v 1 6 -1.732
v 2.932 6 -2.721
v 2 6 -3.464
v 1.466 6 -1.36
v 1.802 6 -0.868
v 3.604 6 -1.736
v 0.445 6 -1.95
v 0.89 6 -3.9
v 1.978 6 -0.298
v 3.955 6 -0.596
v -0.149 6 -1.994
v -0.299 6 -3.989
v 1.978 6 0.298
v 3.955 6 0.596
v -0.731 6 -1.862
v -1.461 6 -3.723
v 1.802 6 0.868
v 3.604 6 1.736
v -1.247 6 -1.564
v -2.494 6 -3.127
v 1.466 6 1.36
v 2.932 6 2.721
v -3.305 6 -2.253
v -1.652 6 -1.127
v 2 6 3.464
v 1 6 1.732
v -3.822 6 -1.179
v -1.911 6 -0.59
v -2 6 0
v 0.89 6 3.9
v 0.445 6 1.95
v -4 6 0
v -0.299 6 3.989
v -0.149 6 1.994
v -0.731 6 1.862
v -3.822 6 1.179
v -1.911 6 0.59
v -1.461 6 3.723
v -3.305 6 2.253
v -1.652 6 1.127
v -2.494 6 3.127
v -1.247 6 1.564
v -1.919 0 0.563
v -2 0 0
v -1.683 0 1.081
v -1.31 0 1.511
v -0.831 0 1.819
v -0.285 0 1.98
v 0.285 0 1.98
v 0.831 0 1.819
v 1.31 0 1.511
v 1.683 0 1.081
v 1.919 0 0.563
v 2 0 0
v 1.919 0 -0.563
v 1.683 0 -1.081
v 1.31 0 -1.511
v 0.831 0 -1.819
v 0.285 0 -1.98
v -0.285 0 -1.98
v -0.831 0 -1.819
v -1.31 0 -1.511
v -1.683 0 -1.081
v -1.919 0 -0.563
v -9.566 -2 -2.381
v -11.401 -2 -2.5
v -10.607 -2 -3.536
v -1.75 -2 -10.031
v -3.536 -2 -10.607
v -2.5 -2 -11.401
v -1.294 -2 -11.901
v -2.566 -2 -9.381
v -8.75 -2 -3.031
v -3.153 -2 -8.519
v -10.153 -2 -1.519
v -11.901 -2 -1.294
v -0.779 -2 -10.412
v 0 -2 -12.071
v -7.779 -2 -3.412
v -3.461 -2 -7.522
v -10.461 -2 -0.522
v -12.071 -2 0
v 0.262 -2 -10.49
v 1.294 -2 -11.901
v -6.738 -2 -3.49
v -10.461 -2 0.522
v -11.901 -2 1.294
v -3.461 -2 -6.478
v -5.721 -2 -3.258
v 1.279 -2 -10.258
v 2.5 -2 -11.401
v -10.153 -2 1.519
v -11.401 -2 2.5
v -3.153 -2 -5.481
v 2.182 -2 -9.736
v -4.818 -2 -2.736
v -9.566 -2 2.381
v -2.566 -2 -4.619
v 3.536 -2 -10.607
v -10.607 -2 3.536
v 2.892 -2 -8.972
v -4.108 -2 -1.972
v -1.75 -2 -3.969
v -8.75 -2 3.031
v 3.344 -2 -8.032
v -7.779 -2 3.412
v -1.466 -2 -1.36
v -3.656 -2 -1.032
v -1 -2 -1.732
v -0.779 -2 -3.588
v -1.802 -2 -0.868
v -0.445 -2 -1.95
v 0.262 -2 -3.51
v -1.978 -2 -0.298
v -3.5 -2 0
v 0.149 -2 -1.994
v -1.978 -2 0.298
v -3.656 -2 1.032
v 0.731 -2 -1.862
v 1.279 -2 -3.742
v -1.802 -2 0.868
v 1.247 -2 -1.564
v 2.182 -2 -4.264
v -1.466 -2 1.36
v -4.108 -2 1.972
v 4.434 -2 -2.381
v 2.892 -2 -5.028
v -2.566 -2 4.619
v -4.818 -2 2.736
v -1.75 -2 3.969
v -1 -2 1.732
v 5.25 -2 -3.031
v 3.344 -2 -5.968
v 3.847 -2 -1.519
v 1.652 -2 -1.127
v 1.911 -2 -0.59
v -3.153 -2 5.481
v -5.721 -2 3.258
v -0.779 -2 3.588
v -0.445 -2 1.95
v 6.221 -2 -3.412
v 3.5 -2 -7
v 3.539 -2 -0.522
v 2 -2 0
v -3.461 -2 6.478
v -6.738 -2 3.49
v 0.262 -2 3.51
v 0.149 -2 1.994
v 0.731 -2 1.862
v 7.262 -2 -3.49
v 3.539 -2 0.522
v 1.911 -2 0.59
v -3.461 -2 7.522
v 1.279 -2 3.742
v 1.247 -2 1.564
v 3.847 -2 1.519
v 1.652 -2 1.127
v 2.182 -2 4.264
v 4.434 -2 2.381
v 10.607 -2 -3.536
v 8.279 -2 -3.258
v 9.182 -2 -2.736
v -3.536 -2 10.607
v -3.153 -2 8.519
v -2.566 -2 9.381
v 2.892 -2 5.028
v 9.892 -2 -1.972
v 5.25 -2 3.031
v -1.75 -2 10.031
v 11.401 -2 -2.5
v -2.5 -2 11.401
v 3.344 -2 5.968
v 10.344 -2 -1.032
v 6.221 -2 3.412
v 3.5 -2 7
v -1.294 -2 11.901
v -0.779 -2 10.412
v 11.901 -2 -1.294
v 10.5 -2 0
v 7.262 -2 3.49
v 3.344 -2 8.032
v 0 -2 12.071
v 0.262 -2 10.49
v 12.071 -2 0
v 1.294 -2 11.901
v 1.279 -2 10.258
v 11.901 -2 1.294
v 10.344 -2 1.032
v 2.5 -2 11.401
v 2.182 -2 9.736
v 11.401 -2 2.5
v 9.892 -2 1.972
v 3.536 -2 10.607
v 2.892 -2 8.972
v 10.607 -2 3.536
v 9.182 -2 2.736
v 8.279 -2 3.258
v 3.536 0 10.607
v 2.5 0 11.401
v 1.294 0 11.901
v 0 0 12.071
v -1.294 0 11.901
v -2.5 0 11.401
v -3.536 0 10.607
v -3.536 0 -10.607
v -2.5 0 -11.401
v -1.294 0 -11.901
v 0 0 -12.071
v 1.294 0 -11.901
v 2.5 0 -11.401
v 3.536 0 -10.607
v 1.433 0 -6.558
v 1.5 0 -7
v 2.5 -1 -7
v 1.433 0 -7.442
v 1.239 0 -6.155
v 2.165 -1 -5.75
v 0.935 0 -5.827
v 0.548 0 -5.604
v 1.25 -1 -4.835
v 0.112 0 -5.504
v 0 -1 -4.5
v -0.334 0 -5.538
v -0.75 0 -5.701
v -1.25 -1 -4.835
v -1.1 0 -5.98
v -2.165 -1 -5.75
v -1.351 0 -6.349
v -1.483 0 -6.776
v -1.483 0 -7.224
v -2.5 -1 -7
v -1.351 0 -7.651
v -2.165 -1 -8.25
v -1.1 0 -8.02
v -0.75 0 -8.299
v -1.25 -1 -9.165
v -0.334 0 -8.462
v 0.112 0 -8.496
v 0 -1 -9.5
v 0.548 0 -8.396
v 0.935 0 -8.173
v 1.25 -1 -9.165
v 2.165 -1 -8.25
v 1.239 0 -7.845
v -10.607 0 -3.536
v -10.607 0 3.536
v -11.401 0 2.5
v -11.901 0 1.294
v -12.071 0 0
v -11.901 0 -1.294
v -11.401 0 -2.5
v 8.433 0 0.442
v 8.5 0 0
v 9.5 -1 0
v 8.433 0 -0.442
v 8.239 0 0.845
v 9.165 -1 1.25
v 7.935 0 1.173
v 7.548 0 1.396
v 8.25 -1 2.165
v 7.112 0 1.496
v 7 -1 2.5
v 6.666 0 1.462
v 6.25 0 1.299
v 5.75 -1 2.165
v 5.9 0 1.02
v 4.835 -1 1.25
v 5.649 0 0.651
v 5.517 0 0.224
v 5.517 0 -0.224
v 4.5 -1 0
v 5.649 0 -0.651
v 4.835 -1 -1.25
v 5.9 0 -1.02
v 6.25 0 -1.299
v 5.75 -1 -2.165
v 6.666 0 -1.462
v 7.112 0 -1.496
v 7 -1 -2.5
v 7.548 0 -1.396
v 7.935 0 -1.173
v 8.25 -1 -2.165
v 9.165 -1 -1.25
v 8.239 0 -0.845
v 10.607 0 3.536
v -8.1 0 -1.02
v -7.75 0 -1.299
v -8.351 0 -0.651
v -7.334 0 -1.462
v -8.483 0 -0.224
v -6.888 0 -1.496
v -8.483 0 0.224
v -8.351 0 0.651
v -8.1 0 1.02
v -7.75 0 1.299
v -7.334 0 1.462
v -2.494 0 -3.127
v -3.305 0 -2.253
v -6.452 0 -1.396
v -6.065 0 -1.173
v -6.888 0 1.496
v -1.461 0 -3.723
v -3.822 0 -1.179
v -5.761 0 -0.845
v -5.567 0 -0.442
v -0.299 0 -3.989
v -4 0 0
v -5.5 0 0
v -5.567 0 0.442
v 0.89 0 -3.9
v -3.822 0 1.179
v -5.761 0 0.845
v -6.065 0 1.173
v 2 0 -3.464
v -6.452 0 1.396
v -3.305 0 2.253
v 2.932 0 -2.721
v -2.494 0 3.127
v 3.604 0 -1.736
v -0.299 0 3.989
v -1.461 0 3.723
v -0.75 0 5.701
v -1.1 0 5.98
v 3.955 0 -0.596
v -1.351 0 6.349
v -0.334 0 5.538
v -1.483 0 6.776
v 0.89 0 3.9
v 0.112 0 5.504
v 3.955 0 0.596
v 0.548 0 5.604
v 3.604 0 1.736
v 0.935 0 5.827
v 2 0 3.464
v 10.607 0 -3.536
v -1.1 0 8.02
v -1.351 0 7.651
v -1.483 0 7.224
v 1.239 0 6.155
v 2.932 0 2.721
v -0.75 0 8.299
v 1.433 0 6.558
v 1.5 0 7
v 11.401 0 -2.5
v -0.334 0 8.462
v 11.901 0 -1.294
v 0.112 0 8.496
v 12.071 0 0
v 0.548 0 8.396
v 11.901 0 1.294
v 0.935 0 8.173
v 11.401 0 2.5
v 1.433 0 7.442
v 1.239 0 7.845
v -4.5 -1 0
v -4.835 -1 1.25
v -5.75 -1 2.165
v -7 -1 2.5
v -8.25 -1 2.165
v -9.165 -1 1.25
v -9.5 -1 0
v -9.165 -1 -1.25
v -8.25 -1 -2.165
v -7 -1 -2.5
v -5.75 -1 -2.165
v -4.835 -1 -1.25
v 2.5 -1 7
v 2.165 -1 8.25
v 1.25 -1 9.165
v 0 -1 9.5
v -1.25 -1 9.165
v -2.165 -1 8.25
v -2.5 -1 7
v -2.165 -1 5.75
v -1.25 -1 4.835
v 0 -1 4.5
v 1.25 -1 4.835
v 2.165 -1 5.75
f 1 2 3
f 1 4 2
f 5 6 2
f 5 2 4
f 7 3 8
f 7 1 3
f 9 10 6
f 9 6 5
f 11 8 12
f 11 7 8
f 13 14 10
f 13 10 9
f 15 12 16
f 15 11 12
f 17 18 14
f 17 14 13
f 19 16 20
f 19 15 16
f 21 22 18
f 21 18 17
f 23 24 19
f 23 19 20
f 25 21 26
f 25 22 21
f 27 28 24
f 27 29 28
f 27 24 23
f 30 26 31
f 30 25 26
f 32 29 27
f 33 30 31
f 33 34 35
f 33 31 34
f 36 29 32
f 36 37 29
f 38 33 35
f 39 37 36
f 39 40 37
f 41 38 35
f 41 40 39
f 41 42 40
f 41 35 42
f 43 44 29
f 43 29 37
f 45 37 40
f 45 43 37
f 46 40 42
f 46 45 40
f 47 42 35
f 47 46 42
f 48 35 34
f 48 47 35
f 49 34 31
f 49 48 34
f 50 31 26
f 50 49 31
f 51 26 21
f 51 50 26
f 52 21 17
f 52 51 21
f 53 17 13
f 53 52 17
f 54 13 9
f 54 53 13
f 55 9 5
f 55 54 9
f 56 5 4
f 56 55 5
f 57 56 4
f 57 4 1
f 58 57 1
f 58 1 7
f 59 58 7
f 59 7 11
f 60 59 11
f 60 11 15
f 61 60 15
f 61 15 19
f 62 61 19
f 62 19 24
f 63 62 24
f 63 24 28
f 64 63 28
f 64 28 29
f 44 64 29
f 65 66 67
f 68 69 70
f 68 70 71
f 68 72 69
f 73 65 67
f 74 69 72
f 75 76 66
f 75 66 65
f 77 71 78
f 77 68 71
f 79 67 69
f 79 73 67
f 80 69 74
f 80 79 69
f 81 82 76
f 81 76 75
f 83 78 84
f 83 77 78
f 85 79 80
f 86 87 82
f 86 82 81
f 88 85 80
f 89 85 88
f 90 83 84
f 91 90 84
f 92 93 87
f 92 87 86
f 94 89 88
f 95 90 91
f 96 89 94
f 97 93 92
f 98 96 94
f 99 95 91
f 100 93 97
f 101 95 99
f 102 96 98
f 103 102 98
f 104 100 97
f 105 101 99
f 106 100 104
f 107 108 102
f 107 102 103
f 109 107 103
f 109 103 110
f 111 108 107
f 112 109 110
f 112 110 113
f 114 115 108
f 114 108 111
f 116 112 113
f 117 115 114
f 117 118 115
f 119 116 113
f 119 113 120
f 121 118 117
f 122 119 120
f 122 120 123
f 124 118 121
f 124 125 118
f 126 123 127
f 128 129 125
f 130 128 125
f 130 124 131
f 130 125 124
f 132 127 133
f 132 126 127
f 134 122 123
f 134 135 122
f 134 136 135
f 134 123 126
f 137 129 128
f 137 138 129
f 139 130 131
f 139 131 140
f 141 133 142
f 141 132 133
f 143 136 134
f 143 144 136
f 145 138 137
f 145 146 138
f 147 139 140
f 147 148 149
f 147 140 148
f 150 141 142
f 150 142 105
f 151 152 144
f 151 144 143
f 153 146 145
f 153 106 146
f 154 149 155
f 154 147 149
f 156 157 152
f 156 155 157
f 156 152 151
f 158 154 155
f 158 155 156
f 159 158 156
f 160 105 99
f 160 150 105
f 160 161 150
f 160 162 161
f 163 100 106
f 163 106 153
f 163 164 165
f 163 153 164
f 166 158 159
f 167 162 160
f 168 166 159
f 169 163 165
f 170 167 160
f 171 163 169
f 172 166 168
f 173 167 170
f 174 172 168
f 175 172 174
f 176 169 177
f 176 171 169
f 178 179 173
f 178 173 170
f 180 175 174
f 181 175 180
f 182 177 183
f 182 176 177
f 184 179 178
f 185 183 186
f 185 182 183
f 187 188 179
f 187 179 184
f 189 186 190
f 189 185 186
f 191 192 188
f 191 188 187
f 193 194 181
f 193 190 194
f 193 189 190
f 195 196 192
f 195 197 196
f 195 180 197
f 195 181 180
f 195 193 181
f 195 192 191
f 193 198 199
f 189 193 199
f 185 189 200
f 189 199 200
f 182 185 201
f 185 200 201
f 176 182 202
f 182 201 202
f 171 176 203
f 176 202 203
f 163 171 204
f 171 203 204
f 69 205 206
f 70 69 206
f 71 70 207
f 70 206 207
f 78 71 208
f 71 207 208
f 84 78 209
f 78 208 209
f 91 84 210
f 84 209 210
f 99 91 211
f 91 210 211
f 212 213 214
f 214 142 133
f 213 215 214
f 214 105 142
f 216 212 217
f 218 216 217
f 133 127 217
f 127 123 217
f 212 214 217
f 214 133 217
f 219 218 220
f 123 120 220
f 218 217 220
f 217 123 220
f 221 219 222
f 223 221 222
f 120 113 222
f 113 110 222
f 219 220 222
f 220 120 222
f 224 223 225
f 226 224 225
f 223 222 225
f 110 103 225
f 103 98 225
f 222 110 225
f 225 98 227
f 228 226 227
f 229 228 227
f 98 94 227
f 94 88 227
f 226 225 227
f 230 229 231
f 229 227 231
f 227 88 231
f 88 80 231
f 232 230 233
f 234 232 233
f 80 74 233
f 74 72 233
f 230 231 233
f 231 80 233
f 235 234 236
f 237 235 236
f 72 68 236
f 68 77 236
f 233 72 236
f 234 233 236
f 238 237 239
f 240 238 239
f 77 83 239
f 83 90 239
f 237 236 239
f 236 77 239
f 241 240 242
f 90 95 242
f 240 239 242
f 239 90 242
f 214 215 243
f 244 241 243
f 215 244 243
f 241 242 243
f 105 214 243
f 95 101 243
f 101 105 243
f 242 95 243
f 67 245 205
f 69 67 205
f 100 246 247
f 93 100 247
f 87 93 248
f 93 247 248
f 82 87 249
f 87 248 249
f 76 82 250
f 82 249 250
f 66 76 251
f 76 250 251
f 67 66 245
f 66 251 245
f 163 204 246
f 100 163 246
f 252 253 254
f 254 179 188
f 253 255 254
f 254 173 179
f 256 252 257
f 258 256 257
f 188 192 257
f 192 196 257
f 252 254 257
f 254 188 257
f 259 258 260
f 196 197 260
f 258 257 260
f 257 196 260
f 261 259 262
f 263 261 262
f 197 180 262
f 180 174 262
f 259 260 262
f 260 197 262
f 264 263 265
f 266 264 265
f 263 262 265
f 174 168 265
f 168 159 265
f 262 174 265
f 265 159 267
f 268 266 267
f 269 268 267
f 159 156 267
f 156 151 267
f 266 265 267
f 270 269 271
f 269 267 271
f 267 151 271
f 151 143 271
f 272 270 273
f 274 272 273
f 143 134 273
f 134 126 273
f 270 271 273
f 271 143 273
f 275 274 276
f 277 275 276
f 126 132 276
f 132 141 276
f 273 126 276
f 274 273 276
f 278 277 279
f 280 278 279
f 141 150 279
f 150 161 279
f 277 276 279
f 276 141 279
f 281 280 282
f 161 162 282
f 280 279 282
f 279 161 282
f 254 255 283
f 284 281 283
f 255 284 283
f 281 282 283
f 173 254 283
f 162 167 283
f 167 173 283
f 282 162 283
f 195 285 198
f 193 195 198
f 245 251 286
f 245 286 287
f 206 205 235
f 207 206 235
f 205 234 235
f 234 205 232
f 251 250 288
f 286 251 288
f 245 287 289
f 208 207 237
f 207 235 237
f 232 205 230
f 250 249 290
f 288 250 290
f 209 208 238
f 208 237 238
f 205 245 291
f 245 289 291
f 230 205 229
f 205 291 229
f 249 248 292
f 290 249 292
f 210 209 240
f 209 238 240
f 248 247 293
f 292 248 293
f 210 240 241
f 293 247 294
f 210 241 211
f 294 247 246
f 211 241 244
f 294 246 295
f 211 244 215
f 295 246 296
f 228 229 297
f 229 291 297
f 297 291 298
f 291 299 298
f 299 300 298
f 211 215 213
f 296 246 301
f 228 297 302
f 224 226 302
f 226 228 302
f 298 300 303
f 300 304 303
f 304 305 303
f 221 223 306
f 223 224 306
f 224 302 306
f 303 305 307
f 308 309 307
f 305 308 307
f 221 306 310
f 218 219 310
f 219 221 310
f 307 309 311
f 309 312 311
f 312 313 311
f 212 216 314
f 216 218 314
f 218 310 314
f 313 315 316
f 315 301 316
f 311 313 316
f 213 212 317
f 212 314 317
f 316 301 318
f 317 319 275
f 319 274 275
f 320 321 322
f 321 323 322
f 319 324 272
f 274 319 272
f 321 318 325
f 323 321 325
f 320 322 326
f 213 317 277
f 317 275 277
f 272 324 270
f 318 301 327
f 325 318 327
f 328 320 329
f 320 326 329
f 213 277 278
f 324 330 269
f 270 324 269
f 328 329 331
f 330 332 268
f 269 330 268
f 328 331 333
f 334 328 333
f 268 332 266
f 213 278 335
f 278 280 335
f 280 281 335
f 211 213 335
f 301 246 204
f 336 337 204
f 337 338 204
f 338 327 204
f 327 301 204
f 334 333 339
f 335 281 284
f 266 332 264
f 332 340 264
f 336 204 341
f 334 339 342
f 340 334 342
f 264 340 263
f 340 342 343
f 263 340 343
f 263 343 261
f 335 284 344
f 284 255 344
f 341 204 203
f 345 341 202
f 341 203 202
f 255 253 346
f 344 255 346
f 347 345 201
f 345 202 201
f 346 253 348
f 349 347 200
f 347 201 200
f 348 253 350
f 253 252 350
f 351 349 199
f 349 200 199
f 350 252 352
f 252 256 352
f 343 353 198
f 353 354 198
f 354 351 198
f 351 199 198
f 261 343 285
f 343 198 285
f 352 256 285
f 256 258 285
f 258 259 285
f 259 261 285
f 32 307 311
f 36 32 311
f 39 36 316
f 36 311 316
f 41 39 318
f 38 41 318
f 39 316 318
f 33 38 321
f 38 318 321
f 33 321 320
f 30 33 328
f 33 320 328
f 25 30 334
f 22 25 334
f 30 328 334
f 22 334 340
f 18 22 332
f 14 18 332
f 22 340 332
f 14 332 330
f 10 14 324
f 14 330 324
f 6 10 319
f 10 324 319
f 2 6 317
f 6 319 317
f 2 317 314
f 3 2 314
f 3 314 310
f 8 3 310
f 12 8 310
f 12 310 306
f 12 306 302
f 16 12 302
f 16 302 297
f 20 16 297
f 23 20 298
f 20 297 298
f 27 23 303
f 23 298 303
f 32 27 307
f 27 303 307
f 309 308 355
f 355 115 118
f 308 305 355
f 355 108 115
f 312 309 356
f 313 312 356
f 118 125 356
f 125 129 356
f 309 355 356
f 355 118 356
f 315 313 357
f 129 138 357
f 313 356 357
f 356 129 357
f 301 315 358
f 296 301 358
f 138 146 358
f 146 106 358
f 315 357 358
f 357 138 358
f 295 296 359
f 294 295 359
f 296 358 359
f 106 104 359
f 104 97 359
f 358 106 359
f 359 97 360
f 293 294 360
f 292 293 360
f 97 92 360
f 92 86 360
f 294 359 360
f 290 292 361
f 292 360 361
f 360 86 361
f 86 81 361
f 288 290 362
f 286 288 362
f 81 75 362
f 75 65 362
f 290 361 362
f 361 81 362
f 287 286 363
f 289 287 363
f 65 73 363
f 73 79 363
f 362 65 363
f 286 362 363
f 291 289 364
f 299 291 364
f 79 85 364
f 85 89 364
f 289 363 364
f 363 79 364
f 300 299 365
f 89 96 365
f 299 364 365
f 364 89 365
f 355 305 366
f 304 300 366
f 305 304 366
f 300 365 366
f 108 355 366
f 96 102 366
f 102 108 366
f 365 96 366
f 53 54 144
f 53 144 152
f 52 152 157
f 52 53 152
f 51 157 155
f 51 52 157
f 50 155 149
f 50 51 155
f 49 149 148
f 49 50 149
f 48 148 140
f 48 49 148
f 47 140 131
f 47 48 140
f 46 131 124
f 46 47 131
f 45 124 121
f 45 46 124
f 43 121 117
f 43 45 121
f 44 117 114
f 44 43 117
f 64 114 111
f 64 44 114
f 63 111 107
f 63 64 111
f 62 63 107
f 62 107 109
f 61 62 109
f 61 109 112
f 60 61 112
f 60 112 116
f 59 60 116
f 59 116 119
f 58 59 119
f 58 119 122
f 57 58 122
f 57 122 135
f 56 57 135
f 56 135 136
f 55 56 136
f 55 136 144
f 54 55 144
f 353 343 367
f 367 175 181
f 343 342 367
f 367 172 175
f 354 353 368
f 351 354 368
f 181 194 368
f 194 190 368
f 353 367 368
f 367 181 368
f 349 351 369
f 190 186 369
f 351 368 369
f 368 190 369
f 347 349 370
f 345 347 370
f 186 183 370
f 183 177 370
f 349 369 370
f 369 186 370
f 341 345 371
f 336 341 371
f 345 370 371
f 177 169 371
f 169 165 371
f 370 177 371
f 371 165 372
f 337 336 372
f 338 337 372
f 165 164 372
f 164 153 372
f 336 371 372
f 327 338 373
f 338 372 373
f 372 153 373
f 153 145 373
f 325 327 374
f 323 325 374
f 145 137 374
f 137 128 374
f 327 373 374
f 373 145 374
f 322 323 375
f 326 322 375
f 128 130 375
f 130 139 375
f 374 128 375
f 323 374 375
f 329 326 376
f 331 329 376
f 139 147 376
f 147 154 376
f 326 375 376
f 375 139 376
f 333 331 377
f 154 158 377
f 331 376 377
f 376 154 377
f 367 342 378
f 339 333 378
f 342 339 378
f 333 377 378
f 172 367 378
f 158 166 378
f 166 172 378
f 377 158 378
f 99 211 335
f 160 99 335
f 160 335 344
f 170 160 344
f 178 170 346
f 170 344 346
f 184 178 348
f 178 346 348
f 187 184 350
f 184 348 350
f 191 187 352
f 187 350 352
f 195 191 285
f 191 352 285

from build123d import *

# Parameters (mm, degrees)
F0_R     = 1.5
F0_R_2   = 2
F1_DEPTH = 2
F2_SIZE  = 1.99999
F3_R     = 4
F3_R_2   = 2
F4_DEPTH = 6


# Not quite as in the source:
# - a fillet or chamfer is up to 0.001 mm smaller than in the source, because OpenCascade refuses the exact size


with BuildPart() as f1:
    # F0 (on Front) → F1 (new body)
    with BuildSketch(Plane.XZ):
        with BuildLine():
            Line((-10.6066017178, -3.5355339059), (-3.5355339059, -10.6066017178))
            ThreePointArc((-3.5355339059, -10.6066017178), (0, -12.0710678119), (3.5355339059, -10.6066017178))
            Line((3.5355339059, -10.6066017178), (10.6066017178, -3.5355339059))
            ThreePointArc((10.6066017178, -3.5355339059), (12.0710678119, 0), (10.6066017178, 3.5355339059))
            Line((10.6066017178, 3.5355339059), (3.5355339059, 10.6066017178))
            ThreePointArc((3.5355339059, 10.6066017178), (0, 12.0710678119), (-3.5355339059, 10.6066017178))
            Line((-3.5355339059, 10.6066017178), (-10.6066017178, 3.5355339059))
            ThreePointArc((-10.6066017178, 3.5355339059), (-12.0710678119, 0), (-10.6066017178, -3.5355339059))
        make_face()
        with Locations((-7, 0)):
            Circle(F0_R, mode=Mode.SUBTRACT)
        with Locations((0, -7)):
            Circle(F0_R, mode=Mode.SUBTRACT)
        Circle(F0_R_2, mode=Mode.SUBTRACT)
        with Locations((7, 0)):
            Circle(F0_R, mode=Mode.SUBTRACT)
        with Locations((0, 7)):
            Circle(F0_R, mode=Mode.SUBTRACT)
    extrude(amount=F1_DEPTH)

    # F2 (size 2 in the source; OpenCascade refuses exactly that, so slightly less here)
    f2_edges = [f1.edges().sort_by_distance(p)[0] for p in [
        (5.5, -2, 0),
        (-1.5, -2, -7),
        (-8.5, -2, 0),
        (-1.5, -2, 7),
    ]]
    chamfer(f2_edges, length=F2_SIZE)

    # F3 (on face) → F4 (join)
    with BuildSketch(Plane(origin=(0, 0, 0), x_dir=(-1, 0, 0), z_dir=(0, 1, 0))):
        Circle(F3_R)
        Circle(F3_R_2, mode=Mode.SUBTRACT)
    extrude(amount=F4_DEPTH)


solid = f1.part
